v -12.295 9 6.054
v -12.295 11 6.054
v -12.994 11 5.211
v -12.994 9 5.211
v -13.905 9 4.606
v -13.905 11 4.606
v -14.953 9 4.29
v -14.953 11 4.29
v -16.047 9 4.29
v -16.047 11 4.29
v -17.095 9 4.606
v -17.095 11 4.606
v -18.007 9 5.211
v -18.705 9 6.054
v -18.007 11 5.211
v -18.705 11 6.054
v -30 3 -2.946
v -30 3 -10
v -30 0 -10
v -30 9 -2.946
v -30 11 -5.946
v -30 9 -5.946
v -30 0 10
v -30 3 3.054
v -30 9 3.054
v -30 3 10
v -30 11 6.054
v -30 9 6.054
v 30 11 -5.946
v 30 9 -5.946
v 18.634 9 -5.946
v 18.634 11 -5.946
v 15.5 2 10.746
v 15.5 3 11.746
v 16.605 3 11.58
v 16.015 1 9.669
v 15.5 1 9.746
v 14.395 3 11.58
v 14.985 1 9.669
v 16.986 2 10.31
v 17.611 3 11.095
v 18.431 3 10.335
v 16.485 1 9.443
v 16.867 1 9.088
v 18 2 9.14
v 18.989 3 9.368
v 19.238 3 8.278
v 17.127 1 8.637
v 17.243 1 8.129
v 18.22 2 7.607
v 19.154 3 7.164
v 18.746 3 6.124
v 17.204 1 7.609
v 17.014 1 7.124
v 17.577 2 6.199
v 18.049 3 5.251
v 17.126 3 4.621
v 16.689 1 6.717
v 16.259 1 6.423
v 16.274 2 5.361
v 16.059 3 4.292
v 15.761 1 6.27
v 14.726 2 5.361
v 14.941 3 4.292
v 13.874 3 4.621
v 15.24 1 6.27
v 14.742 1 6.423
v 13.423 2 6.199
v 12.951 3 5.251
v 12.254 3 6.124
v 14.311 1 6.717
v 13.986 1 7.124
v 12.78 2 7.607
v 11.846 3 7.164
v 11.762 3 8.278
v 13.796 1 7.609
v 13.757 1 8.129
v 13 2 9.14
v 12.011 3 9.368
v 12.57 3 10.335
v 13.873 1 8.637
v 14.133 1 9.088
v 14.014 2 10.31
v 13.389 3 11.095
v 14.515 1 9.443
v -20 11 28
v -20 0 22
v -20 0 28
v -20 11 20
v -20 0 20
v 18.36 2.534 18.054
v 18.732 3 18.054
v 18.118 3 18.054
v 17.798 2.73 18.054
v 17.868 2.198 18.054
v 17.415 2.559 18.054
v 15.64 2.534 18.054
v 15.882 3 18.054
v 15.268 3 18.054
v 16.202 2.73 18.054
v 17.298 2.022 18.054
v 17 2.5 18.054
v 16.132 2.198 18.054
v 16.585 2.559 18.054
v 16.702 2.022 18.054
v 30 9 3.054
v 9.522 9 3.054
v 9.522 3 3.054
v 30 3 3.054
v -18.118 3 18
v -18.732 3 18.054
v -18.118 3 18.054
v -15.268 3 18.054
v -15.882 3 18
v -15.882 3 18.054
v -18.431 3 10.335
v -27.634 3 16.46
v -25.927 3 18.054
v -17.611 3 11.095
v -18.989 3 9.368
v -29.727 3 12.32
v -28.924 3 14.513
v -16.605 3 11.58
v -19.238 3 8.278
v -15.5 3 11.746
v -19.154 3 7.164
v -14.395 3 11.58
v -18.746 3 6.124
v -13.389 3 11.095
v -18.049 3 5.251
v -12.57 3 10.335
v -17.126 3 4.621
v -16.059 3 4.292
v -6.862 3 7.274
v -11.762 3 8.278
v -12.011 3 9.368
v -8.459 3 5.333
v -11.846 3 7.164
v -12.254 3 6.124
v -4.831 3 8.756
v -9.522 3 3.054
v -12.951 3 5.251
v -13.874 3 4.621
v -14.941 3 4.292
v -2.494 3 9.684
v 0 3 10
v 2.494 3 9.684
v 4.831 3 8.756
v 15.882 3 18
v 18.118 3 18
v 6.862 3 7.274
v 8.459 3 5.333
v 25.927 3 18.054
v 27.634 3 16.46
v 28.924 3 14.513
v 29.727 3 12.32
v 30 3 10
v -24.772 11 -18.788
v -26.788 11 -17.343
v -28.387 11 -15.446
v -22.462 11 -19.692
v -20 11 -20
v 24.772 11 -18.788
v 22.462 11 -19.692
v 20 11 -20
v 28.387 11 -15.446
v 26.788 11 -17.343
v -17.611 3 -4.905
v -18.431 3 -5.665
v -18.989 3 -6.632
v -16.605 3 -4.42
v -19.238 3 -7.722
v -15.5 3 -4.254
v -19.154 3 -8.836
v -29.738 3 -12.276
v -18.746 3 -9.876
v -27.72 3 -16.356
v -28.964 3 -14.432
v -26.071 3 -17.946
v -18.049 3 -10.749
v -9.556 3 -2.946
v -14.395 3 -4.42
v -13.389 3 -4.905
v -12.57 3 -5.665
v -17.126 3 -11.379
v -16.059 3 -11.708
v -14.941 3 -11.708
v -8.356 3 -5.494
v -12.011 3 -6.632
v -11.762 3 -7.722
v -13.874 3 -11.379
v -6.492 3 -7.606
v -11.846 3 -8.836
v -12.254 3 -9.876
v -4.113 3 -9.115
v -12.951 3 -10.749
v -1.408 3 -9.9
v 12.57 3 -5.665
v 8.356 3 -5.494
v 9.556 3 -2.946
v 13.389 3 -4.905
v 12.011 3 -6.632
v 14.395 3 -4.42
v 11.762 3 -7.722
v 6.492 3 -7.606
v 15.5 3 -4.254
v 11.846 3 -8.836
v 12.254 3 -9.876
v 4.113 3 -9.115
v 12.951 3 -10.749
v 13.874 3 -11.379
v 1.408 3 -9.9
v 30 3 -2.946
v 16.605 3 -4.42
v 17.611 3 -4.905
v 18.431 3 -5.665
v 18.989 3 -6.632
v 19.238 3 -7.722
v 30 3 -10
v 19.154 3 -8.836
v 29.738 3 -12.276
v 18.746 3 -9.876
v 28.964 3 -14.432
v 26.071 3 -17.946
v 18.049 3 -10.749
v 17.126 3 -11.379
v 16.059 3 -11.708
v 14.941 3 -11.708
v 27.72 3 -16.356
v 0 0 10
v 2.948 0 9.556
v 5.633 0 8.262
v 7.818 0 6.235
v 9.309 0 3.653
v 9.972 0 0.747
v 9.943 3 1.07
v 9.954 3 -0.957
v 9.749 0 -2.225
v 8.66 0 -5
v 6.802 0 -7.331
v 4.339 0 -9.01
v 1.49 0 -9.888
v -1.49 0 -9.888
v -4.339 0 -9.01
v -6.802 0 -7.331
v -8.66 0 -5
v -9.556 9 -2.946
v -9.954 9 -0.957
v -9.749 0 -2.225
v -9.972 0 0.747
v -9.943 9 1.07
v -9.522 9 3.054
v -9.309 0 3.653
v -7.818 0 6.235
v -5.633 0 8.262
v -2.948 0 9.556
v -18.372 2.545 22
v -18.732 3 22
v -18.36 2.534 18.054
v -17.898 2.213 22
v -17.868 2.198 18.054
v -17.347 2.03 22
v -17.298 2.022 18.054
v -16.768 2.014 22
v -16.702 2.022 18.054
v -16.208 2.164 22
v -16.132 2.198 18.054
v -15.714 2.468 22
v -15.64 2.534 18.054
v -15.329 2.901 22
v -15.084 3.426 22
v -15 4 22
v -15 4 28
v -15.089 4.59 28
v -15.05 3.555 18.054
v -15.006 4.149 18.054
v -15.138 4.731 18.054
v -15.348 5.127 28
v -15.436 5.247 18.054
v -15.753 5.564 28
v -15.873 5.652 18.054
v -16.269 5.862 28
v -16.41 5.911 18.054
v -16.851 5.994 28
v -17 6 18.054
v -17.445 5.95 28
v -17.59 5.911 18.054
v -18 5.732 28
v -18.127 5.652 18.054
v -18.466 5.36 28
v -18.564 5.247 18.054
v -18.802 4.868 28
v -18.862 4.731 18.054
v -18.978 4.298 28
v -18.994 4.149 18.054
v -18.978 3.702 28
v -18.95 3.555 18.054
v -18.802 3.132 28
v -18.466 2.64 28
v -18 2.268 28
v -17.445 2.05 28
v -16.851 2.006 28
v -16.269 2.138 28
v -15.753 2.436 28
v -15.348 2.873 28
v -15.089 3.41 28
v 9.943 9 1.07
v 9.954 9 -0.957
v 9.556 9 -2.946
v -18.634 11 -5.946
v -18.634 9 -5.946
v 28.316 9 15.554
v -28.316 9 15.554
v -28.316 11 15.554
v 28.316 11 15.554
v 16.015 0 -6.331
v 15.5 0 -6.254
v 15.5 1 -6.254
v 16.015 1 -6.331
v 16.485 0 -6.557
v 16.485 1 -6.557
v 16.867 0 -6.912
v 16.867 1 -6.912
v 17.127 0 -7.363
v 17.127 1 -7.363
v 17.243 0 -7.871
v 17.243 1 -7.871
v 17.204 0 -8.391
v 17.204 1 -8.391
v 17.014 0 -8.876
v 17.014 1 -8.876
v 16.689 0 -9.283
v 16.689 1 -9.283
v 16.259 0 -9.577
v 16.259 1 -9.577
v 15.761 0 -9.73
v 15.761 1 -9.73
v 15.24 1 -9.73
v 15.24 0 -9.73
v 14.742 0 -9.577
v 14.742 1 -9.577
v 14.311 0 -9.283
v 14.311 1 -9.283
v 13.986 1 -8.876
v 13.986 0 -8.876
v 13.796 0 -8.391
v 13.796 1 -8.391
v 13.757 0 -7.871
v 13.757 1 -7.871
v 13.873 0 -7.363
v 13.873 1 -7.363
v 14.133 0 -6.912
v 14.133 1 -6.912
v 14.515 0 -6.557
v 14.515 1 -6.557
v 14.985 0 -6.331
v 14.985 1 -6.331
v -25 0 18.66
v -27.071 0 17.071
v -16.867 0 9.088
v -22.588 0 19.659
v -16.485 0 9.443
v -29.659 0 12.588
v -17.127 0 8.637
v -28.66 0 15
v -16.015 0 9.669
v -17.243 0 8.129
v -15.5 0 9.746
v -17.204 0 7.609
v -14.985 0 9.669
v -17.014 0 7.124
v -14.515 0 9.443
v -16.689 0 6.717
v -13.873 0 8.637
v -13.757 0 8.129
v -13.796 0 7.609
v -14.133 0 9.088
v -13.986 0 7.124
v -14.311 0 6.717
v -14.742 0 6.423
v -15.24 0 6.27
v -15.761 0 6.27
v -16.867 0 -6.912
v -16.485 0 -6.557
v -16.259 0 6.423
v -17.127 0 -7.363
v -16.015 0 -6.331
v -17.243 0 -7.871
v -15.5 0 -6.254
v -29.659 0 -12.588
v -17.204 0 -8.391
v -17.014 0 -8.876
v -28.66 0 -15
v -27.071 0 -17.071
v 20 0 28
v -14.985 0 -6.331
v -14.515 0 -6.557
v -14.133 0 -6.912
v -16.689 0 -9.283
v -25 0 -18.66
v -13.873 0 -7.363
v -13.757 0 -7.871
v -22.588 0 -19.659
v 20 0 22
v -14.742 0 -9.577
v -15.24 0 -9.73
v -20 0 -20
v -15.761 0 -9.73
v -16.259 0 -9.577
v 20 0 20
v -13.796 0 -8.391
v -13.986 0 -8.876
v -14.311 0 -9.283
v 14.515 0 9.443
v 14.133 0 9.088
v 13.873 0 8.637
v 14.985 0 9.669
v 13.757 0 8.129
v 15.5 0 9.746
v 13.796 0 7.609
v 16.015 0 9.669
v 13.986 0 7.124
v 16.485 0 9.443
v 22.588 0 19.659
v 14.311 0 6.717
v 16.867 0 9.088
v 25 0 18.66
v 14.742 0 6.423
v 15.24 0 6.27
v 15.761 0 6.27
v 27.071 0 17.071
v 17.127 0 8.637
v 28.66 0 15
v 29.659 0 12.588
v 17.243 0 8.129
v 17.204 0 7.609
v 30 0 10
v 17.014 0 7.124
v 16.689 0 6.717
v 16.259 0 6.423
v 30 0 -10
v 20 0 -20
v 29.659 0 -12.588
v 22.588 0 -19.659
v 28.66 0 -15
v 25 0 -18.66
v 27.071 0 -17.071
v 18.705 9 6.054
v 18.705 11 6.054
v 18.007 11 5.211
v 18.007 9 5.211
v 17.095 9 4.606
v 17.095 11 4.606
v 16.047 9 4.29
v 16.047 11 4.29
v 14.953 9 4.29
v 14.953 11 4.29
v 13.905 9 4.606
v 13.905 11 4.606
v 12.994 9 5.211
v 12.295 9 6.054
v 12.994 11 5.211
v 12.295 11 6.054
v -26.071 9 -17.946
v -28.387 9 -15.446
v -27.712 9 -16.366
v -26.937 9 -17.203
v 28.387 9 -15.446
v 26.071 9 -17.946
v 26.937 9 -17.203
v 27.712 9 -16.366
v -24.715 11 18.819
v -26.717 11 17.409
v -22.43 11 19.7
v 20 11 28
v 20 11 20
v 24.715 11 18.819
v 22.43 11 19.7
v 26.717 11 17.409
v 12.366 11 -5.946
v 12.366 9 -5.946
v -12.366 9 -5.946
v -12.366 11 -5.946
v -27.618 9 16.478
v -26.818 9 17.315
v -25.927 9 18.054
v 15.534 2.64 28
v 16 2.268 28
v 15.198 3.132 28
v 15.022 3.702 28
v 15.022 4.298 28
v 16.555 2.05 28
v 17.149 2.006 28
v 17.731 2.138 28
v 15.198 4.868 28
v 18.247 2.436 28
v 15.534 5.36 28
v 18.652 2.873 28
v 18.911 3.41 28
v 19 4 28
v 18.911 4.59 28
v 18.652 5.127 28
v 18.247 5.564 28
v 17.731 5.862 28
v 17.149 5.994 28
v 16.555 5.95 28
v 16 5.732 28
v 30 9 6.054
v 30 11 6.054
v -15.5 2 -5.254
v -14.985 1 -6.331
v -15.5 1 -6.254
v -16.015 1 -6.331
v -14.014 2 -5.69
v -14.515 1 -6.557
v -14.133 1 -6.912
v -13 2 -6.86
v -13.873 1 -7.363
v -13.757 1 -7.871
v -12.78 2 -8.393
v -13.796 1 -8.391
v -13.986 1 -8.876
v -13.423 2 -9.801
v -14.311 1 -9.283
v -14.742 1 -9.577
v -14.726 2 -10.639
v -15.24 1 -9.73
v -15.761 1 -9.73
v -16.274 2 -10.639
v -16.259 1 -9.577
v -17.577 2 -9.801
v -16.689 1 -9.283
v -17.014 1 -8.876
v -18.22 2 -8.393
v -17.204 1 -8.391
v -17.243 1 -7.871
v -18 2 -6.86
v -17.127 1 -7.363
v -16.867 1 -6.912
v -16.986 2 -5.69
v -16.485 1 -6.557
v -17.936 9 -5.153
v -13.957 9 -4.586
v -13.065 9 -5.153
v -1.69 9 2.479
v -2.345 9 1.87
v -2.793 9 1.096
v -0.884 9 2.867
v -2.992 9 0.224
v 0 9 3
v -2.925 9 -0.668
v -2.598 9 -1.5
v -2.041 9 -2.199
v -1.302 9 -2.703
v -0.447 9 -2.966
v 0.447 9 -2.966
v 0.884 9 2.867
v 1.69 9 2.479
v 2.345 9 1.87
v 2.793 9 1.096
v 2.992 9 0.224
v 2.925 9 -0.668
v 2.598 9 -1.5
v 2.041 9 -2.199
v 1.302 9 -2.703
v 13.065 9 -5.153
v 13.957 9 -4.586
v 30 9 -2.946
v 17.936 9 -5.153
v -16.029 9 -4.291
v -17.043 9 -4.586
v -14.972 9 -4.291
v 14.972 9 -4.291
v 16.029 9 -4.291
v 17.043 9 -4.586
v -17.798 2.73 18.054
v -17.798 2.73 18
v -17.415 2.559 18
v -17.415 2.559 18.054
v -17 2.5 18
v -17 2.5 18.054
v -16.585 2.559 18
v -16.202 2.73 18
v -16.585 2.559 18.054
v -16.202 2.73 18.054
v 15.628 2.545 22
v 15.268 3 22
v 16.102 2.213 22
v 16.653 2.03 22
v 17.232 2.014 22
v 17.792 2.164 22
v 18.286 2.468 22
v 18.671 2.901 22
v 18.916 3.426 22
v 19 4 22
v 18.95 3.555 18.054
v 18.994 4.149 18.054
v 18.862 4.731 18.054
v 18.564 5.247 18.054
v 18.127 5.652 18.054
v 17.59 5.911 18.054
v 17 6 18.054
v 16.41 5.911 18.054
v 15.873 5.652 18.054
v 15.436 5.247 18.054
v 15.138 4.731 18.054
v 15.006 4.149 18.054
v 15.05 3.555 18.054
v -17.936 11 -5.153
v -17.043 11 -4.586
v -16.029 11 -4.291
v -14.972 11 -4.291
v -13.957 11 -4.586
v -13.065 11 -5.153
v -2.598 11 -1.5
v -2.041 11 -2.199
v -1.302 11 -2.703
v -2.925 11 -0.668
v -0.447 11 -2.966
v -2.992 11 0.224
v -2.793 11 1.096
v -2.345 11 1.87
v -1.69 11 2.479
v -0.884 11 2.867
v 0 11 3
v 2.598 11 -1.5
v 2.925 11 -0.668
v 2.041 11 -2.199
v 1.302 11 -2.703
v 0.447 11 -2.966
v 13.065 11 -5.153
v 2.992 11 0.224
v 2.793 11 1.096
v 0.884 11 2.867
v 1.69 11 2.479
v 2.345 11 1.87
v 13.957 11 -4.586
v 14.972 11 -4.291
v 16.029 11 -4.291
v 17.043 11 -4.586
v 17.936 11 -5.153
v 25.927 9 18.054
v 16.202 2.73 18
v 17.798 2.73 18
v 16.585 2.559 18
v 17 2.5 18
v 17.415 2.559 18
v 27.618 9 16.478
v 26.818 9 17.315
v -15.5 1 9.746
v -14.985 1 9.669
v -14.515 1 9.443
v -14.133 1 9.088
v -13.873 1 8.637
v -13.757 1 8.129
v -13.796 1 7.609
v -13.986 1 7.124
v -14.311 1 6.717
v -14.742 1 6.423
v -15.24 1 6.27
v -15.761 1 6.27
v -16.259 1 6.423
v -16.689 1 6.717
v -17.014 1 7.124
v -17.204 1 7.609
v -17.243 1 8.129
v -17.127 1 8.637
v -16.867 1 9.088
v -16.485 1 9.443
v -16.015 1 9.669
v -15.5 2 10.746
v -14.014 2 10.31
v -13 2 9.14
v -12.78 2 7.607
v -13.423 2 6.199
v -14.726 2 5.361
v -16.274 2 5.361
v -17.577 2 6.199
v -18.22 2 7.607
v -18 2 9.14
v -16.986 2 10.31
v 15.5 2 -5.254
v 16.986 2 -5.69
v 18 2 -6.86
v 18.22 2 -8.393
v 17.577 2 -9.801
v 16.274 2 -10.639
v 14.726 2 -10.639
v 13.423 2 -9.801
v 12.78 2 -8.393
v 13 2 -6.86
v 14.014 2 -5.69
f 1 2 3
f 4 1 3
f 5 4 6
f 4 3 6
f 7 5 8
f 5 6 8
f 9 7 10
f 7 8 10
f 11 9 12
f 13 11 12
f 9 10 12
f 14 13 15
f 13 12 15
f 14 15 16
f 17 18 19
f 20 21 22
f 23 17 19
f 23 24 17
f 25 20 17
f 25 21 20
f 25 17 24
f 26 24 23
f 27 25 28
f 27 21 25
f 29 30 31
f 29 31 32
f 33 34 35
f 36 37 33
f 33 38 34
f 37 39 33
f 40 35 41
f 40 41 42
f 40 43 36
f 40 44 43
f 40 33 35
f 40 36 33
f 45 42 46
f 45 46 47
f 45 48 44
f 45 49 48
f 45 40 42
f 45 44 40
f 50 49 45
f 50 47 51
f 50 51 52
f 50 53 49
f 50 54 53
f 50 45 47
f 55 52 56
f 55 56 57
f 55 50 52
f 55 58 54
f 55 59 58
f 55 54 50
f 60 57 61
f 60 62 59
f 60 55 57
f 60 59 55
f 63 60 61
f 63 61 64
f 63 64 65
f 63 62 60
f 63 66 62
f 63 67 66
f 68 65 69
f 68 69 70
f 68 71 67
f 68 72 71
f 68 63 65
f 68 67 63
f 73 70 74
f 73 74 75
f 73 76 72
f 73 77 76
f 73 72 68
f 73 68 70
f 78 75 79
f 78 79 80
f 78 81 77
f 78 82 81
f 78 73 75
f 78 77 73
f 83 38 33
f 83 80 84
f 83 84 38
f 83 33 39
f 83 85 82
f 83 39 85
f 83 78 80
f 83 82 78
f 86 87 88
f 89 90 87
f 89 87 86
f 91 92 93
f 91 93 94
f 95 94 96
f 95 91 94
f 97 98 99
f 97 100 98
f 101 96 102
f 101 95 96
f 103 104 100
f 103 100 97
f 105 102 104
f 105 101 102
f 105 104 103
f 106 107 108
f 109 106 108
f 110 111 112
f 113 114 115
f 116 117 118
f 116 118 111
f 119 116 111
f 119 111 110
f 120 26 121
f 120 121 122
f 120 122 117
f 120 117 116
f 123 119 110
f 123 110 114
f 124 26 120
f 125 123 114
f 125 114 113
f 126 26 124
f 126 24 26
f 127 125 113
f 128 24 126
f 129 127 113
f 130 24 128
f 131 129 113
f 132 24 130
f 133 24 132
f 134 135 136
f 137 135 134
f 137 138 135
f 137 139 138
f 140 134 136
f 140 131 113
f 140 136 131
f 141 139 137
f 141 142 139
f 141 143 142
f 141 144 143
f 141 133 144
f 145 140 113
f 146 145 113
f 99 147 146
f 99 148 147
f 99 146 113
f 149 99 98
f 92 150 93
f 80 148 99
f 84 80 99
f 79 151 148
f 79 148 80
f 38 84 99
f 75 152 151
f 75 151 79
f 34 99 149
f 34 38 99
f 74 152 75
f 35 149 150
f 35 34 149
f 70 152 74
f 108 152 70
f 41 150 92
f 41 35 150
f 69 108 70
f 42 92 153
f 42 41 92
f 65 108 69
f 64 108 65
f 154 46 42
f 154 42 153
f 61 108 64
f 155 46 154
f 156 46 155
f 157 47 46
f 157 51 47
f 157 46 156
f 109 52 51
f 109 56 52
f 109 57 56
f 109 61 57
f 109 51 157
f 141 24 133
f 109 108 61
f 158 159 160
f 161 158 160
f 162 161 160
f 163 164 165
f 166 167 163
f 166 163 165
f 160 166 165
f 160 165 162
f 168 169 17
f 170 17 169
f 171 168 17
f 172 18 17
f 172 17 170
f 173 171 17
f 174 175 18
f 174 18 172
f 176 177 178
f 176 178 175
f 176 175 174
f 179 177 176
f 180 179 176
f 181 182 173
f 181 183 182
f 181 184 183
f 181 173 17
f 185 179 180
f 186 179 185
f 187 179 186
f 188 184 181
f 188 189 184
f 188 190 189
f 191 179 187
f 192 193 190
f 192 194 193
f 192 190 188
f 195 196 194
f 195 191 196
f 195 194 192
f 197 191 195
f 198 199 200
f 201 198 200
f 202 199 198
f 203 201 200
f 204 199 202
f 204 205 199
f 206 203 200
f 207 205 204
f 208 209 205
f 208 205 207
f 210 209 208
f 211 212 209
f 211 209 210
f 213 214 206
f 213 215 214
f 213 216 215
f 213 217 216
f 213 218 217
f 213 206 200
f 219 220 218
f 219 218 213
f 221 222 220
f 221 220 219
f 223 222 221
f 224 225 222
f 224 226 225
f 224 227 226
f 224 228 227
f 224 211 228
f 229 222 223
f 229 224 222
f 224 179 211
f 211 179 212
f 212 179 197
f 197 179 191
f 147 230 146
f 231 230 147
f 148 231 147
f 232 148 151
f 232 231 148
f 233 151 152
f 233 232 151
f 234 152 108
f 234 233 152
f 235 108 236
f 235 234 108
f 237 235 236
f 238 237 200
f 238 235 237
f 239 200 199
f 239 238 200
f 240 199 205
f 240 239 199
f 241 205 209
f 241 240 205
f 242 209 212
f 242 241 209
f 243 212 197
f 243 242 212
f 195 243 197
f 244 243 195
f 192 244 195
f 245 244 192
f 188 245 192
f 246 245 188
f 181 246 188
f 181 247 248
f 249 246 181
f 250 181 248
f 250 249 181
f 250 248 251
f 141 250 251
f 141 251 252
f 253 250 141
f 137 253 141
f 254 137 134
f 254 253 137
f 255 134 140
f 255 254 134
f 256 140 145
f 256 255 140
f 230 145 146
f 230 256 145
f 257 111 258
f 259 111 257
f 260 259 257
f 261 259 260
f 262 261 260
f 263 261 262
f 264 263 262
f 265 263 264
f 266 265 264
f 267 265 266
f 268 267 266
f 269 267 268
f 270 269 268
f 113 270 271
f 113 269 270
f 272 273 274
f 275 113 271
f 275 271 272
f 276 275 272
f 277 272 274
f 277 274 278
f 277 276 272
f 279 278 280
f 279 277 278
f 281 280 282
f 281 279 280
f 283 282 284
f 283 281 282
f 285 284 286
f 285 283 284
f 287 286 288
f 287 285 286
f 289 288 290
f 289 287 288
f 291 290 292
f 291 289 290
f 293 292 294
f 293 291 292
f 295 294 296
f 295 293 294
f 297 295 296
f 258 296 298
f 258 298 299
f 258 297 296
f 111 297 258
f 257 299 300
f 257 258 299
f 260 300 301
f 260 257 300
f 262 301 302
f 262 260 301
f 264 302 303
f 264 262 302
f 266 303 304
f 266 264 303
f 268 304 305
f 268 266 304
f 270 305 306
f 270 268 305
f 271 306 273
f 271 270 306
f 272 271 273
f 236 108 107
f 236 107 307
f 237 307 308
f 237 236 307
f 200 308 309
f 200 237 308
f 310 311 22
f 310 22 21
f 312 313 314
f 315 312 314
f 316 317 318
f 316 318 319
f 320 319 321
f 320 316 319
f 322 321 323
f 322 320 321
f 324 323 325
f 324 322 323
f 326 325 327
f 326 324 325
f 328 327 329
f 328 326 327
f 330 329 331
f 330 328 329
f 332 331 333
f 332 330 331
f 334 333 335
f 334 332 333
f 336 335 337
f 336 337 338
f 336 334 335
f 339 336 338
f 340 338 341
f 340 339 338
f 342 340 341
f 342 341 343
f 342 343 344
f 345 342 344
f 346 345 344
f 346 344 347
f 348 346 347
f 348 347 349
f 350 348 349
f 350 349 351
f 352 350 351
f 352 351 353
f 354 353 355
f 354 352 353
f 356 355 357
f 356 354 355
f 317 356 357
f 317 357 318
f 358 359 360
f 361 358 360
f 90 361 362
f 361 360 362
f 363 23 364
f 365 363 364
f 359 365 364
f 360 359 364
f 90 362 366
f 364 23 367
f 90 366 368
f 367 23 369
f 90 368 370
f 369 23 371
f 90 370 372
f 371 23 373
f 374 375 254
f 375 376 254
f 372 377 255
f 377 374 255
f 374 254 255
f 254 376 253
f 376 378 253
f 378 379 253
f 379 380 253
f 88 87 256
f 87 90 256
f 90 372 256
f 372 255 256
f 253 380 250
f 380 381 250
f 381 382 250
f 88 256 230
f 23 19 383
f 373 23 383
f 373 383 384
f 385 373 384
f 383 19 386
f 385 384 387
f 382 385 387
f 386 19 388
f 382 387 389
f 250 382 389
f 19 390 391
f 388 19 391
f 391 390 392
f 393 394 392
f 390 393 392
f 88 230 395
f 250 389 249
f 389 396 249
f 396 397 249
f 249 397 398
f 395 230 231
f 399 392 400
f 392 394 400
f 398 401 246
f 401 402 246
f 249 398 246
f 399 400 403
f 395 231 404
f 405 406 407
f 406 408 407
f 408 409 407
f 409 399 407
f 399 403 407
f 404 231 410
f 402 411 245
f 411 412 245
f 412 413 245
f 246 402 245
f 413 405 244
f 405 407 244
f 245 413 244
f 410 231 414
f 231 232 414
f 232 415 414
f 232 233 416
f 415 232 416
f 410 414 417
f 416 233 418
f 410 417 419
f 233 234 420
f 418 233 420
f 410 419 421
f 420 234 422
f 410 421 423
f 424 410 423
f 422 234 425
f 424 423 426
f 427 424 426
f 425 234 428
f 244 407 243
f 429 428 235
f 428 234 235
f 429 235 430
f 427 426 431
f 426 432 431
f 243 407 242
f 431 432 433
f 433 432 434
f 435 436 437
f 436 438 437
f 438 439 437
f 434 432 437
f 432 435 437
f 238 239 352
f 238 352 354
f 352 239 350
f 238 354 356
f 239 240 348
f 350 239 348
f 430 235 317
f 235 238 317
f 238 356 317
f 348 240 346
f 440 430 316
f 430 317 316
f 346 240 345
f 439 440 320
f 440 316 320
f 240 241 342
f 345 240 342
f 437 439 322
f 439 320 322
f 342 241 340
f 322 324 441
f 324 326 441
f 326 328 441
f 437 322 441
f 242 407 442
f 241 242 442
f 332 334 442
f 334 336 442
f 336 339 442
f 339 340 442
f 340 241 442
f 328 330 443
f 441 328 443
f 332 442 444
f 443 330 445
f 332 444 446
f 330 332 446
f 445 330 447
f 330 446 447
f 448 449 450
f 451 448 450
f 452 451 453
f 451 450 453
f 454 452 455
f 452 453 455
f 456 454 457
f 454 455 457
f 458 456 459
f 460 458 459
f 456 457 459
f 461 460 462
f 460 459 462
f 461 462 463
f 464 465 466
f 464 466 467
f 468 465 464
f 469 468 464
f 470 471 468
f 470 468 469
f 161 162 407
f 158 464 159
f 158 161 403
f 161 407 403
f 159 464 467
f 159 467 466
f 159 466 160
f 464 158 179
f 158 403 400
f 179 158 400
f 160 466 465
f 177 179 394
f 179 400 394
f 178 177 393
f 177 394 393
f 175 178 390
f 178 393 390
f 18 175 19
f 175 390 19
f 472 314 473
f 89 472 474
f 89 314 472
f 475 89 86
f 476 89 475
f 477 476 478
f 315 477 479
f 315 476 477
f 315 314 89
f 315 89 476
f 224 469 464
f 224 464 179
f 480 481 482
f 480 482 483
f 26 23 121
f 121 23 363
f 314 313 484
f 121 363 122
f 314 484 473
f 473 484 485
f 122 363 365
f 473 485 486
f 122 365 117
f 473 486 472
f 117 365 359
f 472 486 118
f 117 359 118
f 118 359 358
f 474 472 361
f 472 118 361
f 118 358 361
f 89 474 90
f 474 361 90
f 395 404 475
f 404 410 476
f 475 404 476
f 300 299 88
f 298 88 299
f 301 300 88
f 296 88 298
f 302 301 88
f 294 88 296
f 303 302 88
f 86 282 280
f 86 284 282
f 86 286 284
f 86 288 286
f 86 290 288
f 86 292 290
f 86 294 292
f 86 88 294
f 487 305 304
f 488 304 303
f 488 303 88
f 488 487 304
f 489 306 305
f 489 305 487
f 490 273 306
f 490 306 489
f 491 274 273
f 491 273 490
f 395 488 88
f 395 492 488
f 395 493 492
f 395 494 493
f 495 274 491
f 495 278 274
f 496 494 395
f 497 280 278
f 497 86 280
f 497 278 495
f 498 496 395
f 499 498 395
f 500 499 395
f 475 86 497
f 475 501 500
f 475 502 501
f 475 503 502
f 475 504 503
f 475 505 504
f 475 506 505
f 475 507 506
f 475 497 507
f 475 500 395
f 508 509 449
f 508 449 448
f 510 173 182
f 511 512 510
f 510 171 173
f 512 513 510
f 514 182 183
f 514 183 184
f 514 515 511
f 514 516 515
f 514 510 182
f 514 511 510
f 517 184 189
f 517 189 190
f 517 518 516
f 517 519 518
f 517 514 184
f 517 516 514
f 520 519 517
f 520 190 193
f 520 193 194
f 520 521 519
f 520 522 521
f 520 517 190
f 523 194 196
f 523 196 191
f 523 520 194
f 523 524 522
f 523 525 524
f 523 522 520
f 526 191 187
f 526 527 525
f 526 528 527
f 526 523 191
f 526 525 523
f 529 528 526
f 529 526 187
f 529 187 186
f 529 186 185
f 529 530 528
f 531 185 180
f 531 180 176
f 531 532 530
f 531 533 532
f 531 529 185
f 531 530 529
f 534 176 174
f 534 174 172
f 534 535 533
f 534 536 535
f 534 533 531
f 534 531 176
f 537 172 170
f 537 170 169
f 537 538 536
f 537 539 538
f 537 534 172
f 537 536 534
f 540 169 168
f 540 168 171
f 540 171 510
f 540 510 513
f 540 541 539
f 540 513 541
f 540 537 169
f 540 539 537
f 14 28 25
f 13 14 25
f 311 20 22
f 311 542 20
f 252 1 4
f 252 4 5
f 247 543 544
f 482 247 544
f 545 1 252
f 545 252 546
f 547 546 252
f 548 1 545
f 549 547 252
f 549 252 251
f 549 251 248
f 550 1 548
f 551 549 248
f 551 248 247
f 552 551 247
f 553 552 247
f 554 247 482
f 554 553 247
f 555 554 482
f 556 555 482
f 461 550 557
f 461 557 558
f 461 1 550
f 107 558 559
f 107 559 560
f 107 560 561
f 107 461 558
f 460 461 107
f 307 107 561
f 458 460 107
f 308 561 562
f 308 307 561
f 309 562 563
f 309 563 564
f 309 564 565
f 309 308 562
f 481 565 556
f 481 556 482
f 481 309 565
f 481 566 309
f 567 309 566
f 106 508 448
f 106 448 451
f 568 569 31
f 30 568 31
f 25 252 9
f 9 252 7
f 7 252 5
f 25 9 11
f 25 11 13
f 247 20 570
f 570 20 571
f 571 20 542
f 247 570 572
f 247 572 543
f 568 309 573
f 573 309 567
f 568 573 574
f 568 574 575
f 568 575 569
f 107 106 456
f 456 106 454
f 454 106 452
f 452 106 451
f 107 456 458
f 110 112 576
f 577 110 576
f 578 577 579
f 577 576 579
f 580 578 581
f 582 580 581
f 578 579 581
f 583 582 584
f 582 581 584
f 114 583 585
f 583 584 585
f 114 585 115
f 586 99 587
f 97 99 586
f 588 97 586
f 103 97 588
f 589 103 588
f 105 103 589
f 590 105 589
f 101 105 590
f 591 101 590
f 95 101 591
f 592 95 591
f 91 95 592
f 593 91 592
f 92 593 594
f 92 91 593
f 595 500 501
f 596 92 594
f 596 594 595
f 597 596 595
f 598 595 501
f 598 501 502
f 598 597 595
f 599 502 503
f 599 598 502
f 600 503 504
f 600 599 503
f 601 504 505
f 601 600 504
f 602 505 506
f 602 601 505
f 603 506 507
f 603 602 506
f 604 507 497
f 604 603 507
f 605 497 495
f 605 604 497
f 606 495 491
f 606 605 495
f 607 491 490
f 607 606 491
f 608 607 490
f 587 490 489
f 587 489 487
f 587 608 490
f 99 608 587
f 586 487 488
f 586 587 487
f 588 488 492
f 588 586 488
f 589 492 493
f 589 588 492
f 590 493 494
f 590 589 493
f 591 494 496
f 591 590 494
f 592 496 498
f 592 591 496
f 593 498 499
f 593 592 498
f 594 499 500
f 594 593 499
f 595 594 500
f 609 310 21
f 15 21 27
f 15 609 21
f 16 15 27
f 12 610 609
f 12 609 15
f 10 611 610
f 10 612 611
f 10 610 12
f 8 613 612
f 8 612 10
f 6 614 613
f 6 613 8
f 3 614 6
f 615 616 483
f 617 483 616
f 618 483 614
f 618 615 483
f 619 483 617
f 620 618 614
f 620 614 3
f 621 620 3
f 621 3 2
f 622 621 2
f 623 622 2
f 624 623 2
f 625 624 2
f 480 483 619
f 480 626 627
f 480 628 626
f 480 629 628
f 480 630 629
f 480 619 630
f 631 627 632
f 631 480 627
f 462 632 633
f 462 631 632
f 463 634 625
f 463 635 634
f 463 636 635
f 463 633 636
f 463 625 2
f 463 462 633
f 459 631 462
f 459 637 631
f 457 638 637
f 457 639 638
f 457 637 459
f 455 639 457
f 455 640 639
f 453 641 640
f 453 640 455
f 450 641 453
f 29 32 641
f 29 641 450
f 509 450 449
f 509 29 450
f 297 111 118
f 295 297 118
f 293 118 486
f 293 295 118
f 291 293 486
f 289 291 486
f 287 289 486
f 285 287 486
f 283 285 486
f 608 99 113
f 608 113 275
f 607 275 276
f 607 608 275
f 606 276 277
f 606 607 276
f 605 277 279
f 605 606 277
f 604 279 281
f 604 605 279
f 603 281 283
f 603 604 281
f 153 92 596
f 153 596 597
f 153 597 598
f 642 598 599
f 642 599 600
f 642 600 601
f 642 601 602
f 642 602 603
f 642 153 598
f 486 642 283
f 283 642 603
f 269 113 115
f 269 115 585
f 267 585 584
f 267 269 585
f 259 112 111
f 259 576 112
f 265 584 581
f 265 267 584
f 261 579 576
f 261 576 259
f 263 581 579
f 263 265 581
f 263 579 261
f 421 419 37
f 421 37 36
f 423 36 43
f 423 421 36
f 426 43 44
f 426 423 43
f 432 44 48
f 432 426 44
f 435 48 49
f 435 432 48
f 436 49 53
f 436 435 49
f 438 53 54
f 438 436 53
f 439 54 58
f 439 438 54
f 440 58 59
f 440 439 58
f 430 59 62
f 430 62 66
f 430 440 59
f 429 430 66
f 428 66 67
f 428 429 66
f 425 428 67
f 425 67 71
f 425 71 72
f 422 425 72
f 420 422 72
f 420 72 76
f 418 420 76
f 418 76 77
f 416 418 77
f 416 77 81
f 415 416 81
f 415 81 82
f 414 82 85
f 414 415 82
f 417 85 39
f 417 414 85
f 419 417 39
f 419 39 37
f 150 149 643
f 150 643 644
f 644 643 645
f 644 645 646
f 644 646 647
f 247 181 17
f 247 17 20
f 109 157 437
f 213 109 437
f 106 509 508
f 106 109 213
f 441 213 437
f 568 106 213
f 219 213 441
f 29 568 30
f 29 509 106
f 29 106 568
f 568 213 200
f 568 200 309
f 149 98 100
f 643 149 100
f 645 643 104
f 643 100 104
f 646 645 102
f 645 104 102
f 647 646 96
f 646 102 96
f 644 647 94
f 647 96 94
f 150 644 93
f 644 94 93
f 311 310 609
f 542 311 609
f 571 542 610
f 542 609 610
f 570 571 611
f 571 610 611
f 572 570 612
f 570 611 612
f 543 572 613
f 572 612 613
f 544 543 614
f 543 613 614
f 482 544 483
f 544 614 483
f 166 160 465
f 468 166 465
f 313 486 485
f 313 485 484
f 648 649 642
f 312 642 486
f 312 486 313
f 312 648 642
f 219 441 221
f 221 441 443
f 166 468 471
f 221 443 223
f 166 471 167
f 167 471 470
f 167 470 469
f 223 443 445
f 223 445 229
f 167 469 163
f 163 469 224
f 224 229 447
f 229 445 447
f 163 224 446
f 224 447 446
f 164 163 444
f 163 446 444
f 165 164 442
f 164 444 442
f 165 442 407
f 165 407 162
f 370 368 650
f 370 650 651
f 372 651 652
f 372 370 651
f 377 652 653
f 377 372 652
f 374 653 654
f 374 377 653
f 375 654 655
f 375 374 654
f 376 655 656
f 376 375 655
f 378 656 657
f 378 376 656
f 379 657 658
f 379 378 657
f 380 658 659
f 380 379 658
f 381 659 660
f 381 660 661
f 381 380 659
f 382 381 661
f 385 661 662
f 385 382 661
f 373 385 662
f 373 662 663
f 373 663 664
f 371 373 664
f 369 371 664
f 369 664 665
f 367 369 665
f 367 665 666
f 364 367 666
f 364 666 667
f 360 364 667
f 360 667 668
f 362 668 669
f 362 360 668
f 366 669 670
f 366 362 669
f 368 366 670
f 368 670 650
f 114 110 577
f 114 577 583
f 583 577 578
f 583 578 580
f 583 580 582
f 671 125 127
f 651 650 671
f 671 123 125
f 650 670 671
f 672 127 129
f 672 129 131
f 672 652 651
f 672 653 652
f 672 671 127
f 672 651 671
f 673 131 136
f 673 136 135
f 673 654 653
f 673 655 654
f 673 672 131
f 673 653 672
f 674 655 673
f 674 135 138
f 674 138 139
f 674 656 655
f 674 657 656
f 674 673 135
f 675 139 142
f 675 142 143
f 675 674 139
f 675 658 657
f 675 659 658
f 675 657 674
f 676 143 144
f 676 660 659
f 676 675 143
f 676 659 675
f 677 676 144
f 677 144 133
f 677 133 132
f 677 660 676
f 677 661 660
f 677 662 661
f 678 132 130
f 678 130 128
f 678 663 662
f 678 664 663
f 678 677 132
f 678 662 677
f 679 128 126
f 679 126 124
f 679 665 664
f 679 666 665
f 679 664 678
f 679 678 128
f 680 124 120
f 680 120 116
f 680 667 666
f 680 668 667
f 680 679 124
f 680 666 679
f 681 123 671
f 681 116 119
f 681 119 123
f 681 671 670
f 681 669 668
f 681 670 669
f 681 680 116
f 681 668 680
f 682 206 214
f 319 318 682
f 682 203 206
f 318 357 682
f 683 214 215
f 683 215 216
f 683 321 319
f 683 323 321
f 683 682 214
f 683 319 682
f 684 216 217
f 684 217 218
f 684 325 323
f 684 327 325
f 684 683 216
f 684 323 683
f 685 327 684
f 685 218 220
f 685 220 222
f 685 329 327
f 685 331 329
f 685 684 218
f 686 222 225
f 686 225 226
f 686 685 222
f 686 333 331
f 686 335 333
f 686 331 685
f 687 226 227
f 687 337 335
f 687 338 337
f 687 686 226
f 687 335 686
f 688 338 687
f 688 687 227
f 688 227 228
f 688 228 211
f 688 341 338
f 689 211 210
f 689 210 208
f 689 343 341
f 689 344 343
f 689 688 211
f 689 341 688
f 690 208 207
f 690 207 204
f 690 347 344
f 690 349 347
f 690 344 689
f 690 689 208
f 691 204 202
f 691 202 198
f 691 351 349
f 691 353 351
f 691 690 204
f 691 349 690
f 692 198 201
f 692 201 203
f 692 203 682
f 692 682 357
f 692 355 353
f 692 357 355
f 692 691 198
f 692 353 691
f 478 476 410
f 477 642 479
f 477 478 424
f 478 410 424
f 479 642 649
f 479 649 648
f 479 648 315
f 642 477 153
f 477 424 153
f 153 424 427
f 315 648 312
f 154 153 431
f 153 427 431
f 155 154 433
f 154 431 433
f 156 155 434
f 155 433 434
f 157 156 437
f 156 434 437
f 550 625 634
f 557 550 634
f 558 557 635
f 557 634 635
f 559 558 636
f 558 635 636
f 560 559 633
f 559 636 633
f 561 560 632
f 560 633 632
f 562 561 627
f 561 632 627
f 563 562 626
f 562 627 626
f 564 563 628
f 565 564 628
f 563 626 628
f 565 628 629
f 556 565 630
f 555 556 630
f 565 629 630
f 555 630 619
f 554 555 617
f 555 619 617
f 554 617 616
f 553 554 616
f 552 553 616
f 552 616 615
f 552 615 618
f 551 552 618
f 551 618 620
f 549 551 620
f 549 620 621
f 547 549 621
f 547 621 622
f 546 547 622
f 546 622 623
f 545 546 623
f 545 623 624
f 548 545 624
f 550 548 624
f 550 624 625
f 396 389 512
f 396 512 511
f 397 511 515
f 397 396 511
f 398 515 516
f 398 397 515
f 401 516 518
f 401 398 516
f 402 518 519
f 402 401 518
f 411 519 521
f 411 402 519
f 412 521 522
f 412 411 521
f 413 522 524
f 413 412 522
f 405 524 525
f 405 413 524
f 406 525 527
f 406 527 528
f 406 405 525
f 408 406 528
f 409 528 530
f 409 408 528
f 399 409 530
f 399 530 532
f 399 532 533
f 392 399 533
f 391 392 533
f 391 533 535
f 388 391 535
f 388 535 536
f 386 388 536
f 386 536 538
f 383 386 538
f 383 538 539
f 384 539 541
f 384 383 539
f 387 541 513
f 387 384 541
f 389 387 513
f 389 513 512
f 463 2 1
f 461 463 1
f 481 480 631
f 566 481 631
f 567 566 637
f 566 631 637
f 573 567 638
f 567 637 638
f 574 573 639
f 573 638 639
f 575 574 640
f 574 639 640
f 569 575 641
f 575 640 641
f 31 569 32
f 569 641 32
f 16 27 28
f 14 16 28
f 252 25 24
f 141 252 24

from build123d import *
from build123d.topology import SkipClean

# Parameters (mm, degrees)
SKETCH1_R           = 9.999999259
SKETCH1_R_2         = 1.748202303
SKETCH1_R_3         = 1.748202071
BOSS_EXTRUDE1_DEPTH = 3
BOSS_EXTRUDE2_REACH = 65.317
BOSS_EXTRUDE3_DEPTH = 59.999998659
CUT_EXTRUDE1_START  = 18
SKETCH3_R           = 9.999999259
CUT_EXTRUDE1_DEPTH  = 18
SKETCH4_W           = 63.792856733
SKETCH4_H           = 41.767533566
CUT_EXTRUDE2_DEPTH  = 29
SKETCH5_R           = 2.99999956
CUT_EXTRUDE3_DEPTH  = 29
CHAMFER1_SIZE       = 2
CHAMFER2_SIZE       = 2
SKETCH6_R           = 3.748202071
SKETCH6_R_2         = 3.748202303
CUT_EXTRUDE4_DEPTH  = 3
SKETCH7_R           = 1.5
CUT_EXTRUDE5_DEPTH  = 2
SKETCH9_W           = 40.000000969
SKETCH9_H           = 2
BOSS_EXTRUDE4_DEPTH = 11
SKETCH10_W          = 40.000000969
SKETCH10_H          = 10.999999914
SKETCH10_R          = 2
BOSS_EXTRUDE5_DEPTH = 6
CUT_EXTRUDE6_START  = -3.945921595
SKETCH10_3_R        = 2
CUT_EXTRUDE6_DEPTH  = 3.945921595


with BuildPart() as part:
    # Sketch1 → Boss-Extrude1 (new body)
    with BuildSketch(Plane(origin=(0, 0, 0), x_dir=(1, 0, 0), z_dir=(0, 1, 0))):
        with BuildLine():
            Line((-19.999999553, -20.000000484), (20.000001416, -20.000000484))
            ThreePointArc((20.000001416, -20.000000484), (27.071068604, -17.071068441), (29.999999329, -10.000000708))
            Line((29.999999329, -10.000000708), (29.999999329, 9.999998845))
            ThreePointArc((29.999999329, 9.999998845), (27.071068411, 17.071066386), (20.000001416, 19.999998622))
            Line((20.000001416, 19.999998622), (-19.999999553, 19.999998622))
            ThreePointArc((-19.999999553, 19.999998622), (-27.071067207, 17.071066499), (-29.999999329, 9.999998845))
            Line((-29.999999329, 9.999998845), (-29.999999329, -10.000000708))
            ThreePointArc((-29.999999329, -10.000000708), (-27.071067207, -17.071068362), (-19.999999553, -20.000000484))
        make_face()
        with Locations(Location((0, 0, 0), (0, 0, 270))):
            Circle(SKETCH1_R, mode=Mode.SUBTRACT)
        with Locations(Location((15.500057023, 8.001796436, 0), (0, 0, 270))):
            Circle(SKETCH1_R_2, mode=Mode.SUBTRACT)
        with Locations(Location((-15.500057023, 8.001796436, 0), (0, 0, 270))):
            Circle(SKETCH1_R_2, mode=Mode.SUBTRACT)
        with Locations(Location((-15.500057023, -7.998204092, 0), (0, 0, 270))):
            Circle(SKETCH1_R_3, mode=Mode.SUBTRACT)
        with Locations(Location((15.500057023, -7.998204092, 0), (0, 0, 270))):
            Circle(SKETCH1_R_3, mode=Mode.SUBTRACT)
    extrude(amount=BOSS_EXTRUDE1_DEPTH)

    # Boss-Extrude2: up to this face of the body (flat: up to its plane)
    boss_extrude2_end = Plane(part.part.faces().sort_by_distance((-29.999999329, 1.5, 9.31e-07))[0])
    # Sketch2 → Boss-Extrude2 (add, up to the picked face)
    with BuildSketch(Plane(origin=(29.999999329, 0, 0), x_dir=(0, 0, -1), z_dir=(1, 0, 0)), mode=Mode.PRIVATE) as boss_extrude2_sk1:
        Polygon((-6.054078553, 8.999999586), (-3.054078061, 8.999999586), (-3.054078061, 3), (2.94592106, 3), (2.94592106, 8.999999586), (5.945921552, 8.999999586), (5.945921552, 10.999999914), (-6.054078553, 10.999999914), align=None)
    boss_extrude2_tool1 = split(extrude(boss_extrude2_sk1.sketch, amount=-BOSS_EXTRUDE2_REACH, mode=Mode.PRIVATE), bisect_by=boss_extrude2_end, keep=Keep.BOTH, mode=Mode.PRIVATE)
    # Sketch2 → Boss-Extrude2 (add, up to the picked face)
    with BuildSketch(Plane(origin=(29.999999329, 0, 0), x_dir=(0, 0, -1), z_dir=(1, 0, 0)), mode=Mode.PRIVATE) as boss_extrude2_sk2:
        Polygon((-15.554079178, 10.999999914), (-20.000000484, 10.999999914), (-20.000000484, 3), (-18.05407889, 3), (-18.05407889, 8.999999586), (-15.554079178, 8.999999586), align=None)
    boss_extrude2_tool2 = split(extrude(boss_extrude2_sk2.sketch, amount=-BOSS_EXTRUDE2_REACH, mode=Mode.PRIVATE), bisect_by=boss_extrude2_end, keep=Keep.BOTH, mode=Mode.PRIVATE)
    # Sketch2 → Boss-Extrude2 (add, up to the picked face)
    with BuildSketch(Plane(origin=(29.999999329, 0, 0), x_dir=(0, 0, -1), z_dir=(1, 0, 0)), mode=Mode.PRIVATE) as boss_extrude2_sk3:
        Polygon((19.737818007, 10.999999914), (15.445922178, 10.999999914), (15.445922178, 8.999999586), (17.945919793, 8.999999586), (17.945919793, 3), (19.872933217, 3), (19.872933217, 8.999999586), (19.737818007, 8.999999586), align=None)
    boss_extrude2_tool3 = split(extrude(boss_extrude2_sk3.sketch, amount=-BOSS_EXTRUDE2_REACH, mode=Mode.PRIVATE), bisect_by=boss_extrude2_end, keep=Keep.BOTH, mode=Mode.PRIVATE)
    add(boss_extrude2_tool1.solids().sort_by(Axis((29.999999, 7.6, 0.054079), (-1, 0, 0)))[0])
    add(boss_extrude2_tool2.solids().sort_by(Axis((29.999999, 7.72931, 18.48663), (-1, 0, 0)))[0])
    add(boss_extrude2_tool3.solids().sort_by(Axis((29.999999, 7.704328, -18.348039), (-1, 0, 0)))[0])

    # Sketch2<3> → Boss-Extrude3 (add)
    with BuildSketch(Plane(origin=(29.999999329, 0, 0), x_dir=(0, 0, -1), z_dir=(1, 0, 0))):
        Polygon((19.945920121, 10.999999914), (19.737818007, 10.999999914), (19.737818007, 8.999999586), (19.872933217, 8.999999586), (19.945920121, 8.999999586), align=None)
        Polygon((19.999998622, 10.999999914), (19.945920121, 10.999999914), (19.945920121, 8.999999586), (19.872933217, 8.999999586), (19.872933217, 3), (19.999998622, 3), align=None)
    extrude(amount=-BOSS_EXTRUDE3_DEPTH)

    # Sketch3 → Cut-Extrude1 (cut)
    with SkipClean():  # the faces are left unmerged after this step: merging them gives an invalid solid
        with BuildSketch(Plane.XZ.offset(-8.999999586).offset(CUT_EXTRUDE1_START)):
            with Locations(Location((0, 0, 0), (0, 0, 342.86691881))):
                Circle(SKETCH3_R)
        extrude(amount=-CUT_EXTRUDE1_DEPTH, mode=Mode.SUBTRACT)
    add(part.part.scale(1), mode=Mode.REPLACE)  # the faces are merged on a copy

    # Sketch4 → Cut-Extrude2 (cut)
    with BuildSketch(Plane.XZ):
        with Locations((1.275857135, -0.402901322)):
            Rectangle(SKETCH4_W, SKETCH4_H)
        with BuildLine():
            Line((20.000001416, 20.000000484), (-19.999999553, 20.000000484))
            ThreePointArc((-19.999999553, 20.000000484), (-27.071067207, 17.071068362), (-29.999999329, 10.000000708))
            Line((-29.999999329, 10.000000708), (-29.999999329, -9.999998845))
            ThreePointArc((-29.999999329, -9.999998845), (-27.071067207, -17.071066499), (-19.999999553, -19.999998622))
            Line((-19.999999553, -19.999998622), (20.000001416, -19.999998622))
            ThreePointArc((20.000001416, -19.999998622), (27.071068411, -17.071066386), (29.999999329, -9.999998845))
            Line((29.999999329, -9.999998845), (29.999999329, 10.000000708))
            ThreePointArc((29.999999329, 10.000000708), (27.071068604, 17.071068441), (20.000001416, 20.000000484))
        make_face(mode=Mode.SUBTRACT)
    extrude(amount=-CUT_EXTRUDE2_DEPTH, mode=Mode.SUBTRACT)

    # Sketch5 → Cut-Extrude3 (cut)
    with BuildSketch(Plane(origin=(0, 10.999999914, 0), x_dir=(1, 0, 0), z_dir=(0, 1, 0))):
        with Locations(Location((0, 0, 0), (0, 0, 270))):
            Circle(SKETCH5_R)
    extrude(amount=-CUT_EXTRUDE3_DEPTH, mode=Mode.SUBTRACT)

    # Chamfer1
    chamfer1_edges = [part.edges().sort_by_distance(p)[0] for p in [
        (-15.500057023, 3, 6.250002021),
    ]]
    chamfer(chamfer1_edges, length=CHAMFER1_SIZE)

    # Chamfer2
    chamfer2_edges = [part.edges().sort_by_distance(p)[0] for p in [
        (15.500057023, 3, -9.749998739),
        (-15.500057023, 3, -9.749998739),
        (15.500057023, 3, 6.250002021),
    ]]
    chamfer(chamfer2_edges, length=CHAMFER2_SIZE)

    # Sketch6 → Cut-Extrude4 (cut)
    with BuildSketch(Plane(origin=(0, 10.999999914, 0), x_dir=(1, 0, 0), z_dir=(0, 1, 0))):
        with Locations((-15.500057023, -7.998204092)):
            Circle(SKETCH6_R)
        with Locations((-15.500057023, 8.001796436)):
            Circle(SKETCH6_R_2)
        with Locations((15.500057023, -7.998204092)):
            Circle(SKETCH6_R)
        with Locations((15.500057023, 8.001796436)):
            Circle(SKETCH6_R_2)
    extrude(amount=-CUT_EXTRUDE4_DEPTH, mode=Mode.SUBTRACT)

    # Sketch7 → Cut-Extrude5 (cut)
    with BuildSketch(Plane.XY.offset(20.000000484)):
        with Locations((-17, 3.999999914)):
            Circle(SKETCH7_R)
        with Locations((17, 3.999999914)):
            Circle(SKETCH7_R)
    extrude(amount=-CUT_EXTRUDE5_DEPTH, mode=Mode.SUBTRACT)

    # Sketch9 → Boss-Extrude4 (add)
    with BuildSketch(Plane(origin=(0, 10.999999914, 0), x_dir=(1, 0, 0), z_dir=(0, 1, 0))):
        with Locations((9.31e-07, -21.000000484)):
            Rectangle(SKETCH9_W, SKETCH9_H)
    extrude(amount=-BOSS_EXTRUDE4_DEPTH)

    # Sketch10 → Boss-Extrude5 (add)
    with BuildSketch(Plane.XY.offset(22.000000484)):
        with Locations((9.31e-07, 5.499999957)):
            Rectangle(SKETCH10_W, SKETCH10_H)
        with Locations((-17, 3.999999914)):
            Circle(SKETCH10_R, mode=Mode.SUBTRACT)
        with Locations((17, 3.999999914)):
            Circle(SKETCH10_R, mode=Mode.SUBTRACT)
    extrude(amount=BOSS_EXTRUDE5_DEPTH)

    # Sketch10<3> → Cut-Extrude6 (cut)
    with BuildSketch(Plane.XY.offset(22.000000484).offset(CUT_EXTRUDE6_START)):
        with Locations(Location((17, 3.999999914, 0), (0, 0, 209.999997166))):
            Circle(SKETCH10_3_R)
        with Locations(Location((-17, 3.999999914, 0), (0, 0, 209.999997166))):
            Circle(SKETCH10_3_R)
    extrude(amount=CUT_EXTRUDE6_DEPTH, mode=Mode.SUBTRACT)


solid = part.part
